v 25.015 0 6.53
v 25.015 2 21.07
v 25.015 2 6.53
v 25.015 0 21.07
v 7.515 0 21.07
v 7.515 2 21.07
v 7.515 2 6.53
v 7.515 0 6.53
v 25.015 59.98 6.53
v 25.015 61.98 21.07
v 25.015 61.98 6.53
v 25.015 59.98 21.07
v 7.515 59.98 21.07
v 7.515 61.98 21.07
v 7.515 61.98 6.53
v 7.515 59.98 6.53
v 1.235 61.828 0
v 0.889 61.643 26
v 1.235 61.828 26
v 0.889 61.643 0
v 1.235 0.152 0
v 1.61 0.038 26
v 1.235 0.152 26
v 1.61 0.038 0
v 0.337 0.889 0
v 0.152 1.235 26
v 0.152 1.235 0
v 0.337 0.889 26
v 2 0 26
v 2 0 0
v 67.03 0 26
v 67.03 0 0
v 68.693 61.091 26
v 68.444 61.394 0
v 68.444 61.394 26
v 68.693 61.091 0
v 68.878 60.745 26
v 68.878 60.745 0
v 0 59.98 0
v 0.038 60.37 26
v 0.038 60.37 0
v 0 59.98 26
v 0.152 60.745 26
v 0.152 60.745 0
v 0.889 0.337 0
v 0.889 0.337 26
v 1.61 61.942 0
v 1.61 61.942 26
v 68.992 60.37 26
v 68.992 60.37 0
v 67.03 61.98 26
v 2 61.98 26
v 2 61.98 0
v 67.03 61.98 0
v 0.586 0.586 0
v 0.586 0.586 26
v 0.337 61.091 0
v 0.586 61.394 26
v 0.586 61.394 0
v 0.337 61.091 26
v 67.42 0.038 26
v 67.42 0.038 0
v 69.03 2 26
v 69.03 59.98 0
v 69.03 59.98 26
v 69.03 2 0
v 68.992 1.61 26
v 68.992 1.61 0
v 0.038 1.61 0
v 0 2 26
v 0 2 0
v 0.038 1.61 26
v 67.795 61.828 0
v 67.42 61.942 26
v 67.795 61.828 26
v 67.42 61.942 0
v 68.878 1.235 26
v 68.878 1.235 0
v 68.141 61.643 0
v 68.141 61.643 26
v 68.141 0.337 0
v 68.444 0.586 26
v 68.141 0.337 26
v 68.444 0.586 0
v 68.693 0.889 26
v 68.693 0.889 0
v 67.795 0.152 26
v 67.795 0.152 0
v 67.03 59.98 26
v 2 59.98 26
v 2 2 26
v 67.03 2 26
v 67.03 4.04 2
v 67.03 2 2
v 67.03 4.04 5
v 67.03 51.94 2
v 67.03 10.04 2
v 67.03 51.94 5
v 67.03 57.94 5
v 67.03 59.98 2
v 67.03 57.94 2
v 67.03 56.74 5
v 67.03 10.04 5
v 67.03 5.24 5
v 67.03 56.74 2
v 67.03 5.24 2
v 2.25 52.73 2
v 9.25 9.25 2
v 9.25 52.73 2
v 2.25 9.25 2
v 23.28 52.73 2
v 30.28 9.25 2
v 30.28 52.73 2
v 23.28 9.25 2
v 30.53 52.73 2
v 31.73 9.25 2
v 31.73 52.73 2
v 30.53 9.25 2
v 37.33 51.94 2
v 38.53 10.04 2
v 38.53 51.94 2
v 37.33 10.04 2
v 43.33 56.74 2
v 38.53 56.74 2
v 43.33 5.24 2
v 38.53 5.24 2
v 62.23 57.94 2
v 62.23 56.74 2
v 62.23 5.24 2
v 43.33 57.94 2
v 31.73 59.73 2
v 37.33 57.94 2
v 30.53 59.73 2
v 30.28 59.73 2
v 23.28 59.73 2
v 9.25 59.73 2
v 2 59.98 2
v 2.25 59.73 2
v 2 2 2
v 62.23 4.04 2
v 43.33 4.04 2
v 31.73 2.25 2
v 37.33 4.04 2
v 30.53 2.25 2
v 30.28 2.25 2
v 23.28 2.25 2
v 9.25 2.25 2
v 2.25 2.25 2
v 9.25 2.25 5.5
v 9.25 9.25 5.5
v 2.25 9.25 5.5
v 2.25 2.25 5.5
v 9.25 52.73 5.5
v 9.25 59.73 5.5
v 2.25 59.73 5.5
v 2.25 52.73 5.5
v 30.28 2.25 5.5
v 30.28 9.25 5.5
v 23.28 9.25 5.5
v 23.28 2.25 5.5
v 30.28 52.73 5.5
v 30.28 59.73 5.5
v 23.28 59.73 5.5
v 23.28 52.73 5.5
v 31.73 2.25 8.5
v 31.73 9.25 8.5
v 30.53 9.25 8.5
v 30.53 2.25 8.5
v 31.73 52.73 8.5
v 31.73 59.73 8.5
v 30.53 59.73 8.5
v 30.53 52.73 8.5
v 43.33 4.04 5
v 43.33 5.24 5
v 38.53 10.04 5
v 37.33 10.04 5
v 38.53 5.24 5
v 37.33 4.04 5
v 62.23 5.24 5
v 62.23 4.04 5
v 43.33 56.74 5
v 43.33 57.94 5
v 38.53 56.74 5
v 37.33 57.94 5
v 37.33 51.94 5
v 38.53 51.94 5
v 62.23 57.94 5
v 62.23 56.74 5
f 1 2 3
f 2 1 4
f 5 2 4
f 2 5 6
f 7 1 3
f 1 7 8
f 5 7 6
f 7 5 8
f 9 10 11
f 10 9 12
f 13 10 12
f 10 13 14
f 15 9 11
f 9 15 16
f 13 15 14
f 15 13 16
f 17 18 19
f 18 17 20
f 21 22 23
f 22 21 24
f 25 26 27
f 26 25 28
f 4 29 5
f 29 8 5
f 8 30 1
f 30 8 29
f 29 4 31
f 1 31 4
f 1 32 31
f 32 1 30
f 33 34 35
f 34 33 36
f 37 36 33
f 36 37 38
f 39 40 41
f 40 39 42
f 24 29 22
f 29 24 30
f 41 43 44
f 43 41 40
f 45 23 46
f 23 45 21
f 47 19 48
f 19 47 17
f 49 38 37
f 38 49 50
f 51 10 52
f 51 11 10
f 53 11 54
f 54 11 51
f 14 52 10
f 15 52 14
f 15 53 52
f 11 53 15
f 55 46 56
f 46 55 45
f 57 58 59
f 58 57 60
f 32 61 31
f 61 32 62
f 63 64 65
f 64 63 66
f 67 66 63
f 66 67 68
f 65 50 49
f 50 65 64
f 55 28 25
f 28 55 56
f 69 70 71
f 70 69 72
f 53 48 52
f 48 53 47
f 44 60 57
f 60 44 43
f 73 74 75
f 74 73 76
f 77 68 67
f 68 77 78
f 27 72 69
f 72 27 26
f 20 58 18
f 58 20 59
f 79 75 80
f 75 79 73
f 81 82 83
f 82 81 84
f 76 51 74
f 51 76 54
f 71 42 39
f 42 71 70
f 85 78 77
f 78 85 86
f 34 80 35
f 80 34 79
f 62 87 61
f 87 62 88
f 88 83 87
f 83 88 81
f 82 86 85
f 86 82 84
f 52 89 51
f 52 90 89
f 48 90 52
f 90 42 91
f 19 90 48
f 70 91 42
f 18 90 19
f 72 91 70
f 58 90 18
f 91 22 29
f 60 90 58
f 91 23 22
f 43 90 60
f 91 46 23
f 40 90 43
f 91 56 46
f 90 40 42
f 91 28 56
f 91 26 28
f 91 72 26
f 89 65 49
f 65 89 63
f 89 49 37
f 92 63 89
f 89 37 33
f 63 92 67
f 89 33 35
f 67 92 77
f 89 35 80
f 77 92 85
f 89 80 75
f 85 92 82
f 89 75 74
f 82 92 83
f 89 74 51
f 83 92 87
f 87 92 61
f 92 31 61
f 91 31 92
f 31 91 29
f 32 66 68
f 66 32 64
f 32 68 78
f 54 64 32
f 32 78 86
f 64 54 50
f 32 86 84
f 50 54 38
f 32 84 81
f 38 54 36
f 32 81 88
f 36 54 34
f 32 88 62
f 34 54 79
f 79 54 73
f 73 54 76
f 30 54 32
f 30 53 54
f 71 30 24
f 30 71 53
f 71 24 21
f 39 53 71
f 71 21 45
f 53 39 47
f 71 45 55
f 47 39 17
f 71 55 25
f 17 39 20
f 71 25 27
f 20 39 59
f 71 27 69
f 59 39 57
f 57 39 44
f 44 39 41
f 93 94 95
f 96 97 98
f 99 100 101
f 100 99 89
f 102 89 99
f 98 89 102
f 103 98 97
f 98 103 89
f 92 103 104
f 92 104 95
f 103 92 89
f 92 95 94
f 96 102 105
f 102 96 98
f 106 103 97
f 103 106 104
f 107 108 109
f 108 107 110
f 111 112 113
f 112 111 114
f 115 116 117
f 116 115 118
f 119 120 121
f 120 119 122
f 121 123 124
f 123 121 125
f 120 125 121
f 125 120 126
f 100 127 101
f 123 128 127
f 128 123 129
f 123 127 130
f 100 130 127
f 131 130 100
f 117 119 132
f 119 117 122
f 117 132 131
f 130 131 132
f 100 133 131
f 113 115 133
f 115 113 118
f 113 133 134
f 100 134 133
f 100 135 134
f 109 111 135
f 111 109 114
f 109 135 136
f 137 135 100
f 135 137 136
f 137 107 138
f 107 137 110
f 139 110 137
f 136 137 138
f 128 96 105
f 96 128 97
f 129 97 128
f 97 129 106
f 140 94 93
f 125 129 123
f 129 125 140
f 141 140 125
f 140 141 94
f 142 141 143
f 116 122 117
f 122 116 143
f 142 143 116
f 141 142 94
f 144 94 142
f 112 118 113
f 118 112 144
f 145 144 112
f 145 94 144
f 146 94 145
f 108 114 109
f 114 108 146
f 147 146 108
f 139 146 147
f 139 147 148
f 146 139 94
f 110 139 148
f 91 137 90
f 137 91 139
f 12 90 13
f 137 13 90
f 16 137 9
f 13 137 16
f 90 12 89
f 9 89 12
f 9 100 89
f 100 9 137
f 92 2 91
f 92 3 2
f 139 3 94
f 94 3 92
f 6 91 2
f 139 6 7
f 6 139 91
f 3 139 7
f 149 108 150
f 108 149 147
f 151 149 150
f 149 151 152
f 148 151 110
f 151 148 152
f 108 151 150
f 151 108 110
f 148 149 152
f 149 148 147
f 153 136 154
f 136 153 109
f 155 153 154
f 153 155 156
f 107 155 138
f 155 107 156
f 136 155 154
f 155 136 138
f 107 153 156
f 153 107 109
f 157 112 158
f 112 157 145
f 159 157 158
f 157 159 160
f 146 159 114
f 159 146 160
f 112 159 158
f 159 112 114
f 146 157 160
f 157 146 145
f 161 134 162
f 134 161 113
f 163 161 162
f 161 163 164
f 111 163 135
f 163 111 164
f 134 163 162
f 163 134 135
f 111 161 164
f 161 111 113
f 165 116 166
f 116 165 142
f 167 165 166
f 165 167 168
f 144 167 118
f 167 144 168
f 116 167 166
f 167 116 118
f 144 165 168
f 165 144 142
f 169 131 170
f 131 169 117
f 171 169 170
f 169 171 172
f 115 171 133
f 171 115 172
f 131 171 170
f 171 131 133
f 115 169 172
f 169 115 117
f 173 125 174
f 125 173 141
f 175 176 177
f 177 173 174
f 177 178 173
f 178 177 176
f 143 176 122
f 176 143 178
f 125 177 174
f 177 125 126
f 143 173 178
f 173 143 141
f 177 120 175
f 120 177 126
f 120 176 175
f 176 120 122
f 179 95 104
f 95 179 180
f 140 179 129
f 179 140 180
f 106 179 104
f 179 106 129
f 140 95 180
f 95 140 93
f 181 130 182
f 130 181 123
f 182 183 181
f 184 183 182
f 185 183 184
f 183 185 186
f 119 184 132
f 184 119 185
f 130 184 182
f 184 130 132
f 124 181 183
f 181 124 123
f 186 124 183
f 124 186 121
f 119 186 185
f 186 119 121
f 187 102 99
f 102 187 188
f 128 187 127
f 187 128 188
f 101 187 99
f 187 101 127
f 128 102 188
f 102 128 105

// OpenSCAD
// Uplift desk ESP32 + RJ45 breakout enclosure
// Units: mm. Render with: part = "base" | "lid" | "both" | "preview"

part = "preview";

// --- Print tuning ---------------------------------------------------------
fit   = 0.5;   // total clearance added to each board dimension
wall  = 2.0;
floor_t = 2.0;
lid_t = 2.0;
lid_lip_h = 3.0;
lid_lip_t = 1.2;
lid_fit = 0.25; // gap between lid lip and inner wall, per side

// --- RJ45 breakout board (docs/rj45-breakout-board.md) --------------------
rj_len   = 57.48;  // along the port axis (ports on both ends)
rj_wid   = 28.03;
rj_pcb_t = 1.63;
rj_riser = 3.5;    // lift above floor to clear 2-3mm of solder on the bottom

jack_w = 16.3;
jack_h = 13.34;
jack_margin = 0.6; // extra opening around the jack, per side

// Corner pads sit under the mounting-hole corners
pad = 7;
guide_t = 1.2;     // locating tabs along the inner (ESP-side) edge
guide_h = 3;       // how far tabs rise above the PCB bottom

// --- ESP32 DevKit V1 (USB-C) ----------------------------------------------
esp_len = 51;
esp_wid = 28;
esp_guides = true;  // low corner brackets so it doesn't slide around
esp_guide_h = 3;
esp_guide_leg = 6;

// --- Layout ---------------------------------------------------------------
gap = 8;           // open space between boards for wiring
inner_h = 24;      // tallest stack: ESP32 + headers + wire is ~20mm

inner_x = (rj_wid + fit) + gap + (esp_wid + fit);
inner_y = max(rj_len, esp_len) + fit;
outer_x = inner_x + 2 * wall;
outer_y = inner_y + 2 * wall;
outer_h = floor_t + inner_h;

// Board origins (inner-cavity coordinates offset by wall)
rj_x0  = wall + fit / 2;
rj_y0  = wall + (inner_y - rj_len) / 2;
esp_x0 = wall + inner_x - esp_wid - fit / 2;
esp_y0 = wall + (inner_y - esp_len) / 2;

pcb_bottom_z = floor_t + rj_riser;
jack_z0 = pcb_bottom_z + rj_pcb_t;

corner_r = 2;
$fn = 32;

module rounded_box(x, y, h, r) {
    hull() for (i = [r, x - r], j = [r, y - r])
        translate([i, j, 0]) cylinder(r = r, h = h);
}

module jack_cutout() {
    cw = jack_w + 2 * jack_margin;
    ch = jack_h + 2 * jack_margin;
    cx = rj_x0 + rj_wid / 2 - cw / 2;
    for (y = [-1, outer_y - wall - 1])
        translate([cx, y, jack_z0 - jack_margin]) cube([cw, wall + 2, ch]);
}

module rj_supports() {
    // Corner pads
    for (i = [0, 1], j = [0, 1])
        translate([rj_x0 + i * (rj_wid - pad), rj_y0 + j * (rj_len - pad), floor_t - 0.01])
            cube([pad, pad, rj_riser + 0.01]);
    // Tabs on the ESP-side edge stop the board sliding sideways
    for (j = [0, 1])
        translate([rj_x0 + rj_wid + fit / 2, rj_y0 + j * (rj_len - pad), floor_t - 0.01])
            cube([guide_t, pad, rj_riser + guide_h + 0.01]);
}

module esp_supports() {
    l = esp_guide_leg;
    h = esp_guide_h + 0.01;
    o = fit / 2 + guide_t; // guide sits just outside the board outline
    x0 = esp_x0 - o;
    y0 = esp_y0 - o;
    x1 = esp_x0 + esp_wid + o;
    y1 = esp_y0 + esp_len + o;
    // [corner x, corner y, x direction into board, y direction into board]
    for (c = [[x0, y0, 1, 1], [x1, y0, -1, 1], [x0, y1, 1, -1], [x1, y1, -1, -1]]) {
        translate([c[2] > 0 ? c[0] : c[0] - l, c[3] > 0 ? c[1] : c[1] - guide_t, floor_t - 0.01])
            cube([l, guide_t, h]);
        translate([c[2] > 0 ? c[0] : c[0] - guide_t, c[3] > 0 ? c[1] : c[1] - l, floor_t - 0.01])
            cube([guide_t, l, h]);
    }
}

module base() {
    difference() {
        rounded_box(outer_x, outer_y, outer_h, corner_r);
        translate([wall, wall, floor_t]) cube([inner_x, inner_y, inner_h + 1]);
        jack_cutout();
    }
    intersection() {
        // Keep supports inside the cavity
        translate([wall, wall, 0]) cube([inner_x, inner_y, outer_h]);
        union() {
            rj_supports();
            if (esp_guides) esp_supports();
        }
    }
}

module lid() {
    rounded_box(outer_x, outer_y, lid_t, corner_r);
    lx = inner_x - 2 * lid_fit;
    ly = inner_y - 2 * lid_fit;
    translate([wall + lid_fit, wall + lid_fit, lid_t - 0.01])
        difference() {
            cube([lx, ly, lid_lip_h]);
            translate([lid_lip_t, lid_lip_t, -1])
                cube([lx - 2 * lid_lip_t, ly - 2 * lid_lip_t, lid_lip_h + 2]);
        }
}

// Ghost boards for visual checking only
module ghosts() {
    %translate([rj_x0, rj_y0, pcb_bottom_z]) {
        cube([rj_wid, rj_len, rj_pcb_t]);
        for (y = [0, rj_len - 15.55])
            translate([rj_wid / 2 - jack_w / 2, y, rj_pcb_t]) cube([jack_w, 15.55, jack_h]);
    }
    %translate([esp_x0, esp_y0, floor_t]) cube([esp_wid, esp_len, 20]);
}

if (part == "base") base();
else if (part == "lid") lid();
else if (part == "both") {
    base();
    translate([outer_x + 10, 0, 0]) lid();
}
else { // preview
    base();
    ghosts();
}
